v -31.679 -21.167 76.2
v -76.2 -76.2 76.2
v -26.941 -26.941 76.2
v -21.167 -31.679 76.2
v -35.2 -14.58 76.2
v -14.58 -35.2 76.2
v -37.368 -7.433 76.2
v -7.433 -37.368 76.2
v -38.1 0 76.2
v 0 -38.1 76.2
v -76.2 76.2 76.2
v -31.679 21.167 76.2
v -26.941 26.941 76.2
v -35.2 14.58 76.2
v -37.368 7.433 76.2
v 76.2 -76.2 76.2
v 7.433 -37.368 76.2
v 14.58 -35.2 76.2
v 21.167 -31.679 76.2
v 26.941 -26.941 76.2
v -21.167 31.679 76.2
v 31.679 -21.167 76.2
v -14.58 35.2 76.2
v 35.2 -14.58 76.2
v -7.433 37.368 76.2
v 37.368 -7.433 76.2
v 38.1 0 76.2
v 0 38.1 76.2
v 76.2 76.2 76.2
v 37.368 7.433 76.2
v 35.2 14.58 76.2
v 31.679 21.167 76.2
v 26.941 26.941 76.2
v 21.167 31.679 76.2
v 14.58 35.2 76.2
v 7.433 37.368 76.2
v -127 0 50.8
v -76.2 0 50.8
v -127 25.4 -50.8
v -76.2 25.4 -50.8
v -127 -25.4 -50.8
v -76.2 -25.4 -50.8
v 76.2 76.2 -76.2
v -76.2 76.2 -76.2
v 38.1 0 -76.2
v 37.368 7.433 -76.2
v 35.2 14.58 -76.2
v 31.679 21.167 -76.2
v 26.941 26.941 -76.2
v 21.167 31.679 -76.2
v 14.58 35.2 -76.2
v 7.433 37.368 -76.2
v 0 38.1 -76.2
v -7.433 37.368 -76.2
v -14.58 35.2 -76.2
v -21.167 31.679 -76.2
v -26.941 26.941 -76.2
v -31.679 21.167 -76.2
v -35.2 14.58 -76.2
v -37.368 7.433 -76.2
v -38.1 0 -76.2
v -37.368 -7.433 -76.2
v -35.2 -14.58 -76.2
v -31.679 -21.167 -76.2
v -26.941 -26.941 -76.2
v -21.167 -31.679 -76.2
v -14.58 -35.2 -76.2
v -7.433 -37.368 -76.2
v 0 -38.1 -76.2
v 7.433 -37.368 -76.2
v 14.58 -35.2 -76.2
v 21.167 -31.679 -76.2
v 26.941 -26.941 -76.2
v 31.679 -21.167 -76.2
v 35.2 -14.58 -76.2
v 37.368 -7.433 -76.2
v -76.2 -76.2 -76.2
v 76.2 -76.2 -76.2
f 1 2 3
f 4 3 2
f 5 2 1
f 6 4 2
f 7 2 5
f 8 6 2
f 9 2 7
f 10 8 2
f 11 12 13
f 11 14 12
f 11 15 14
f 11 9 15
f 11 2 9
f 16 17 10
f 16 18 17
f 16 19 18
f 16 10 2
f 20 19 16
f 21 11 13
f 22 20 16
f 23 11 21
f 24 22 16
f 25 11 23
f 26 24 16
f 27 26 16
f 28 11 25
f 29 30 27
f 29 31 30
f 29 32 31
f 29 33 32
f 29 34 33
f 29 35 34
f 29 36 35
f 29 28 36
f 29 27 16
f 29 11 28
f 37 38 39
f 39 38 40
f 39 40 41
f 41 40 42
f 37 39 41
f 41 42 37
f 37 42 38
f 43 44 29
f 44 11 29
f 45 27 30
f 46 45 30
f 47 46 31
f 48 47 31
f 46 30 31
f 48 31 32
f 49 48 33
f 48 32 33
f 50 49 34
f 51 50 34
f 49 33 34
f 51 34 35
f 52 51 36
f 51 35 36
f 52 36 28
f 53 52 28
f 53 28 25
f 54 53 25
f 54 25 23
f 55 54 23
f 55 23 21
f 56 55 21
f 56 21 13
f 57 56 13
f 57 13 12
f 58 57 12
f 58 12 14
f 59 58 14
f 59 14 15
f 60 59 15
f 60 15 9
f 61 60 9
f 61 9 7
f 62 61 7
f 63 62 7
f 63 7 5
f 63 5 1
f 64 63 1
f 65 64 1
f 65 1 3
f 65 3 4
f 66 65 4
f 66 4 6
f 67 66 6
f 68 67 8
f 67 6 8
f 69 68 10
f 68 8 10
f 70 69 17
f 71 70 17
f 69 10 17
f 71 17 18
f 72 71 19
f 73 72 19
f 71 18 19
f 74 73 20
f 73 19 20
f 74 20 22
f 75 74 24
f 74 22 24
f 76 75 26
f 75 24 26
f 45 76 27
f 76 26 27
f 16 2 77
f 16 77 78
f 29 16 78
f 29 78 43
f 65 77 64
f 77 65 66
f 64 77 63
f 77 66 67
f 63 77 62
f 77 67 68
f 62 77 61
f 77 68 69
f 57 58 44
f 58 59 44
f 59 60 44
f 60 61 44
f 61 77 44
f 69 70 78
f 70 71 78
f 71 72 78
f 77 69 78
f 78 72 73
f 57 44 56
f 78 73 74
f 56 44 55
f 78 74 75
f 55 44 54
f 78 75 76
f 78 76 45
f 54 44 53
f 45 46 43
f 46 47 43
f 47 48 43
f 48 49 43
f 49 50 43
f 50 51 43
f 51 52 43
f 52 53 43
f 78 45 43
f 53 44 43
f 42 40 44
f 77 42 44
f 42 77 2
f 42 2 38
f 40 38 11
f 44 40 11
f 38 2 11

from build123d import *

# Parameters (mm, degrees)
F0_W     = 152.4
F0_H     = 152.4
F1_DEPTH = 76.2
F2_R     = 38.1
F3_DEPTH = 152.401
F5_DEPTH = 50.8


with BuildPart() as f1:
    # F0 (on Top) → F1 (new body, symmetric)
    with BuildSketch(Plane.XY):
        Rectangle(F0_W, F0_H)
    extrude(amount=F1_DEPTH, both=True)

    # F2 (on face) → F3 (cut, through all)
    with BuildSketch(Plane.XY.offset(76.2)):
        Circle(F2_R)
    extrude(amount=-F3_DEPTH, mode=Mode.SUBTRACT)

    # F4 (on face) → F5 (join)
    with BuildSketch(Plane(origin=(-76.2, 0, 0), x_dir=(0, -1, 0), z_dir=(-1, 0, 0))):
        Polygon((0, 50.8), (-25.4, -50.8), (25.4, -50.8), align=None)
    extrude(amount=F5_DEPTH)


solid = f1.part
